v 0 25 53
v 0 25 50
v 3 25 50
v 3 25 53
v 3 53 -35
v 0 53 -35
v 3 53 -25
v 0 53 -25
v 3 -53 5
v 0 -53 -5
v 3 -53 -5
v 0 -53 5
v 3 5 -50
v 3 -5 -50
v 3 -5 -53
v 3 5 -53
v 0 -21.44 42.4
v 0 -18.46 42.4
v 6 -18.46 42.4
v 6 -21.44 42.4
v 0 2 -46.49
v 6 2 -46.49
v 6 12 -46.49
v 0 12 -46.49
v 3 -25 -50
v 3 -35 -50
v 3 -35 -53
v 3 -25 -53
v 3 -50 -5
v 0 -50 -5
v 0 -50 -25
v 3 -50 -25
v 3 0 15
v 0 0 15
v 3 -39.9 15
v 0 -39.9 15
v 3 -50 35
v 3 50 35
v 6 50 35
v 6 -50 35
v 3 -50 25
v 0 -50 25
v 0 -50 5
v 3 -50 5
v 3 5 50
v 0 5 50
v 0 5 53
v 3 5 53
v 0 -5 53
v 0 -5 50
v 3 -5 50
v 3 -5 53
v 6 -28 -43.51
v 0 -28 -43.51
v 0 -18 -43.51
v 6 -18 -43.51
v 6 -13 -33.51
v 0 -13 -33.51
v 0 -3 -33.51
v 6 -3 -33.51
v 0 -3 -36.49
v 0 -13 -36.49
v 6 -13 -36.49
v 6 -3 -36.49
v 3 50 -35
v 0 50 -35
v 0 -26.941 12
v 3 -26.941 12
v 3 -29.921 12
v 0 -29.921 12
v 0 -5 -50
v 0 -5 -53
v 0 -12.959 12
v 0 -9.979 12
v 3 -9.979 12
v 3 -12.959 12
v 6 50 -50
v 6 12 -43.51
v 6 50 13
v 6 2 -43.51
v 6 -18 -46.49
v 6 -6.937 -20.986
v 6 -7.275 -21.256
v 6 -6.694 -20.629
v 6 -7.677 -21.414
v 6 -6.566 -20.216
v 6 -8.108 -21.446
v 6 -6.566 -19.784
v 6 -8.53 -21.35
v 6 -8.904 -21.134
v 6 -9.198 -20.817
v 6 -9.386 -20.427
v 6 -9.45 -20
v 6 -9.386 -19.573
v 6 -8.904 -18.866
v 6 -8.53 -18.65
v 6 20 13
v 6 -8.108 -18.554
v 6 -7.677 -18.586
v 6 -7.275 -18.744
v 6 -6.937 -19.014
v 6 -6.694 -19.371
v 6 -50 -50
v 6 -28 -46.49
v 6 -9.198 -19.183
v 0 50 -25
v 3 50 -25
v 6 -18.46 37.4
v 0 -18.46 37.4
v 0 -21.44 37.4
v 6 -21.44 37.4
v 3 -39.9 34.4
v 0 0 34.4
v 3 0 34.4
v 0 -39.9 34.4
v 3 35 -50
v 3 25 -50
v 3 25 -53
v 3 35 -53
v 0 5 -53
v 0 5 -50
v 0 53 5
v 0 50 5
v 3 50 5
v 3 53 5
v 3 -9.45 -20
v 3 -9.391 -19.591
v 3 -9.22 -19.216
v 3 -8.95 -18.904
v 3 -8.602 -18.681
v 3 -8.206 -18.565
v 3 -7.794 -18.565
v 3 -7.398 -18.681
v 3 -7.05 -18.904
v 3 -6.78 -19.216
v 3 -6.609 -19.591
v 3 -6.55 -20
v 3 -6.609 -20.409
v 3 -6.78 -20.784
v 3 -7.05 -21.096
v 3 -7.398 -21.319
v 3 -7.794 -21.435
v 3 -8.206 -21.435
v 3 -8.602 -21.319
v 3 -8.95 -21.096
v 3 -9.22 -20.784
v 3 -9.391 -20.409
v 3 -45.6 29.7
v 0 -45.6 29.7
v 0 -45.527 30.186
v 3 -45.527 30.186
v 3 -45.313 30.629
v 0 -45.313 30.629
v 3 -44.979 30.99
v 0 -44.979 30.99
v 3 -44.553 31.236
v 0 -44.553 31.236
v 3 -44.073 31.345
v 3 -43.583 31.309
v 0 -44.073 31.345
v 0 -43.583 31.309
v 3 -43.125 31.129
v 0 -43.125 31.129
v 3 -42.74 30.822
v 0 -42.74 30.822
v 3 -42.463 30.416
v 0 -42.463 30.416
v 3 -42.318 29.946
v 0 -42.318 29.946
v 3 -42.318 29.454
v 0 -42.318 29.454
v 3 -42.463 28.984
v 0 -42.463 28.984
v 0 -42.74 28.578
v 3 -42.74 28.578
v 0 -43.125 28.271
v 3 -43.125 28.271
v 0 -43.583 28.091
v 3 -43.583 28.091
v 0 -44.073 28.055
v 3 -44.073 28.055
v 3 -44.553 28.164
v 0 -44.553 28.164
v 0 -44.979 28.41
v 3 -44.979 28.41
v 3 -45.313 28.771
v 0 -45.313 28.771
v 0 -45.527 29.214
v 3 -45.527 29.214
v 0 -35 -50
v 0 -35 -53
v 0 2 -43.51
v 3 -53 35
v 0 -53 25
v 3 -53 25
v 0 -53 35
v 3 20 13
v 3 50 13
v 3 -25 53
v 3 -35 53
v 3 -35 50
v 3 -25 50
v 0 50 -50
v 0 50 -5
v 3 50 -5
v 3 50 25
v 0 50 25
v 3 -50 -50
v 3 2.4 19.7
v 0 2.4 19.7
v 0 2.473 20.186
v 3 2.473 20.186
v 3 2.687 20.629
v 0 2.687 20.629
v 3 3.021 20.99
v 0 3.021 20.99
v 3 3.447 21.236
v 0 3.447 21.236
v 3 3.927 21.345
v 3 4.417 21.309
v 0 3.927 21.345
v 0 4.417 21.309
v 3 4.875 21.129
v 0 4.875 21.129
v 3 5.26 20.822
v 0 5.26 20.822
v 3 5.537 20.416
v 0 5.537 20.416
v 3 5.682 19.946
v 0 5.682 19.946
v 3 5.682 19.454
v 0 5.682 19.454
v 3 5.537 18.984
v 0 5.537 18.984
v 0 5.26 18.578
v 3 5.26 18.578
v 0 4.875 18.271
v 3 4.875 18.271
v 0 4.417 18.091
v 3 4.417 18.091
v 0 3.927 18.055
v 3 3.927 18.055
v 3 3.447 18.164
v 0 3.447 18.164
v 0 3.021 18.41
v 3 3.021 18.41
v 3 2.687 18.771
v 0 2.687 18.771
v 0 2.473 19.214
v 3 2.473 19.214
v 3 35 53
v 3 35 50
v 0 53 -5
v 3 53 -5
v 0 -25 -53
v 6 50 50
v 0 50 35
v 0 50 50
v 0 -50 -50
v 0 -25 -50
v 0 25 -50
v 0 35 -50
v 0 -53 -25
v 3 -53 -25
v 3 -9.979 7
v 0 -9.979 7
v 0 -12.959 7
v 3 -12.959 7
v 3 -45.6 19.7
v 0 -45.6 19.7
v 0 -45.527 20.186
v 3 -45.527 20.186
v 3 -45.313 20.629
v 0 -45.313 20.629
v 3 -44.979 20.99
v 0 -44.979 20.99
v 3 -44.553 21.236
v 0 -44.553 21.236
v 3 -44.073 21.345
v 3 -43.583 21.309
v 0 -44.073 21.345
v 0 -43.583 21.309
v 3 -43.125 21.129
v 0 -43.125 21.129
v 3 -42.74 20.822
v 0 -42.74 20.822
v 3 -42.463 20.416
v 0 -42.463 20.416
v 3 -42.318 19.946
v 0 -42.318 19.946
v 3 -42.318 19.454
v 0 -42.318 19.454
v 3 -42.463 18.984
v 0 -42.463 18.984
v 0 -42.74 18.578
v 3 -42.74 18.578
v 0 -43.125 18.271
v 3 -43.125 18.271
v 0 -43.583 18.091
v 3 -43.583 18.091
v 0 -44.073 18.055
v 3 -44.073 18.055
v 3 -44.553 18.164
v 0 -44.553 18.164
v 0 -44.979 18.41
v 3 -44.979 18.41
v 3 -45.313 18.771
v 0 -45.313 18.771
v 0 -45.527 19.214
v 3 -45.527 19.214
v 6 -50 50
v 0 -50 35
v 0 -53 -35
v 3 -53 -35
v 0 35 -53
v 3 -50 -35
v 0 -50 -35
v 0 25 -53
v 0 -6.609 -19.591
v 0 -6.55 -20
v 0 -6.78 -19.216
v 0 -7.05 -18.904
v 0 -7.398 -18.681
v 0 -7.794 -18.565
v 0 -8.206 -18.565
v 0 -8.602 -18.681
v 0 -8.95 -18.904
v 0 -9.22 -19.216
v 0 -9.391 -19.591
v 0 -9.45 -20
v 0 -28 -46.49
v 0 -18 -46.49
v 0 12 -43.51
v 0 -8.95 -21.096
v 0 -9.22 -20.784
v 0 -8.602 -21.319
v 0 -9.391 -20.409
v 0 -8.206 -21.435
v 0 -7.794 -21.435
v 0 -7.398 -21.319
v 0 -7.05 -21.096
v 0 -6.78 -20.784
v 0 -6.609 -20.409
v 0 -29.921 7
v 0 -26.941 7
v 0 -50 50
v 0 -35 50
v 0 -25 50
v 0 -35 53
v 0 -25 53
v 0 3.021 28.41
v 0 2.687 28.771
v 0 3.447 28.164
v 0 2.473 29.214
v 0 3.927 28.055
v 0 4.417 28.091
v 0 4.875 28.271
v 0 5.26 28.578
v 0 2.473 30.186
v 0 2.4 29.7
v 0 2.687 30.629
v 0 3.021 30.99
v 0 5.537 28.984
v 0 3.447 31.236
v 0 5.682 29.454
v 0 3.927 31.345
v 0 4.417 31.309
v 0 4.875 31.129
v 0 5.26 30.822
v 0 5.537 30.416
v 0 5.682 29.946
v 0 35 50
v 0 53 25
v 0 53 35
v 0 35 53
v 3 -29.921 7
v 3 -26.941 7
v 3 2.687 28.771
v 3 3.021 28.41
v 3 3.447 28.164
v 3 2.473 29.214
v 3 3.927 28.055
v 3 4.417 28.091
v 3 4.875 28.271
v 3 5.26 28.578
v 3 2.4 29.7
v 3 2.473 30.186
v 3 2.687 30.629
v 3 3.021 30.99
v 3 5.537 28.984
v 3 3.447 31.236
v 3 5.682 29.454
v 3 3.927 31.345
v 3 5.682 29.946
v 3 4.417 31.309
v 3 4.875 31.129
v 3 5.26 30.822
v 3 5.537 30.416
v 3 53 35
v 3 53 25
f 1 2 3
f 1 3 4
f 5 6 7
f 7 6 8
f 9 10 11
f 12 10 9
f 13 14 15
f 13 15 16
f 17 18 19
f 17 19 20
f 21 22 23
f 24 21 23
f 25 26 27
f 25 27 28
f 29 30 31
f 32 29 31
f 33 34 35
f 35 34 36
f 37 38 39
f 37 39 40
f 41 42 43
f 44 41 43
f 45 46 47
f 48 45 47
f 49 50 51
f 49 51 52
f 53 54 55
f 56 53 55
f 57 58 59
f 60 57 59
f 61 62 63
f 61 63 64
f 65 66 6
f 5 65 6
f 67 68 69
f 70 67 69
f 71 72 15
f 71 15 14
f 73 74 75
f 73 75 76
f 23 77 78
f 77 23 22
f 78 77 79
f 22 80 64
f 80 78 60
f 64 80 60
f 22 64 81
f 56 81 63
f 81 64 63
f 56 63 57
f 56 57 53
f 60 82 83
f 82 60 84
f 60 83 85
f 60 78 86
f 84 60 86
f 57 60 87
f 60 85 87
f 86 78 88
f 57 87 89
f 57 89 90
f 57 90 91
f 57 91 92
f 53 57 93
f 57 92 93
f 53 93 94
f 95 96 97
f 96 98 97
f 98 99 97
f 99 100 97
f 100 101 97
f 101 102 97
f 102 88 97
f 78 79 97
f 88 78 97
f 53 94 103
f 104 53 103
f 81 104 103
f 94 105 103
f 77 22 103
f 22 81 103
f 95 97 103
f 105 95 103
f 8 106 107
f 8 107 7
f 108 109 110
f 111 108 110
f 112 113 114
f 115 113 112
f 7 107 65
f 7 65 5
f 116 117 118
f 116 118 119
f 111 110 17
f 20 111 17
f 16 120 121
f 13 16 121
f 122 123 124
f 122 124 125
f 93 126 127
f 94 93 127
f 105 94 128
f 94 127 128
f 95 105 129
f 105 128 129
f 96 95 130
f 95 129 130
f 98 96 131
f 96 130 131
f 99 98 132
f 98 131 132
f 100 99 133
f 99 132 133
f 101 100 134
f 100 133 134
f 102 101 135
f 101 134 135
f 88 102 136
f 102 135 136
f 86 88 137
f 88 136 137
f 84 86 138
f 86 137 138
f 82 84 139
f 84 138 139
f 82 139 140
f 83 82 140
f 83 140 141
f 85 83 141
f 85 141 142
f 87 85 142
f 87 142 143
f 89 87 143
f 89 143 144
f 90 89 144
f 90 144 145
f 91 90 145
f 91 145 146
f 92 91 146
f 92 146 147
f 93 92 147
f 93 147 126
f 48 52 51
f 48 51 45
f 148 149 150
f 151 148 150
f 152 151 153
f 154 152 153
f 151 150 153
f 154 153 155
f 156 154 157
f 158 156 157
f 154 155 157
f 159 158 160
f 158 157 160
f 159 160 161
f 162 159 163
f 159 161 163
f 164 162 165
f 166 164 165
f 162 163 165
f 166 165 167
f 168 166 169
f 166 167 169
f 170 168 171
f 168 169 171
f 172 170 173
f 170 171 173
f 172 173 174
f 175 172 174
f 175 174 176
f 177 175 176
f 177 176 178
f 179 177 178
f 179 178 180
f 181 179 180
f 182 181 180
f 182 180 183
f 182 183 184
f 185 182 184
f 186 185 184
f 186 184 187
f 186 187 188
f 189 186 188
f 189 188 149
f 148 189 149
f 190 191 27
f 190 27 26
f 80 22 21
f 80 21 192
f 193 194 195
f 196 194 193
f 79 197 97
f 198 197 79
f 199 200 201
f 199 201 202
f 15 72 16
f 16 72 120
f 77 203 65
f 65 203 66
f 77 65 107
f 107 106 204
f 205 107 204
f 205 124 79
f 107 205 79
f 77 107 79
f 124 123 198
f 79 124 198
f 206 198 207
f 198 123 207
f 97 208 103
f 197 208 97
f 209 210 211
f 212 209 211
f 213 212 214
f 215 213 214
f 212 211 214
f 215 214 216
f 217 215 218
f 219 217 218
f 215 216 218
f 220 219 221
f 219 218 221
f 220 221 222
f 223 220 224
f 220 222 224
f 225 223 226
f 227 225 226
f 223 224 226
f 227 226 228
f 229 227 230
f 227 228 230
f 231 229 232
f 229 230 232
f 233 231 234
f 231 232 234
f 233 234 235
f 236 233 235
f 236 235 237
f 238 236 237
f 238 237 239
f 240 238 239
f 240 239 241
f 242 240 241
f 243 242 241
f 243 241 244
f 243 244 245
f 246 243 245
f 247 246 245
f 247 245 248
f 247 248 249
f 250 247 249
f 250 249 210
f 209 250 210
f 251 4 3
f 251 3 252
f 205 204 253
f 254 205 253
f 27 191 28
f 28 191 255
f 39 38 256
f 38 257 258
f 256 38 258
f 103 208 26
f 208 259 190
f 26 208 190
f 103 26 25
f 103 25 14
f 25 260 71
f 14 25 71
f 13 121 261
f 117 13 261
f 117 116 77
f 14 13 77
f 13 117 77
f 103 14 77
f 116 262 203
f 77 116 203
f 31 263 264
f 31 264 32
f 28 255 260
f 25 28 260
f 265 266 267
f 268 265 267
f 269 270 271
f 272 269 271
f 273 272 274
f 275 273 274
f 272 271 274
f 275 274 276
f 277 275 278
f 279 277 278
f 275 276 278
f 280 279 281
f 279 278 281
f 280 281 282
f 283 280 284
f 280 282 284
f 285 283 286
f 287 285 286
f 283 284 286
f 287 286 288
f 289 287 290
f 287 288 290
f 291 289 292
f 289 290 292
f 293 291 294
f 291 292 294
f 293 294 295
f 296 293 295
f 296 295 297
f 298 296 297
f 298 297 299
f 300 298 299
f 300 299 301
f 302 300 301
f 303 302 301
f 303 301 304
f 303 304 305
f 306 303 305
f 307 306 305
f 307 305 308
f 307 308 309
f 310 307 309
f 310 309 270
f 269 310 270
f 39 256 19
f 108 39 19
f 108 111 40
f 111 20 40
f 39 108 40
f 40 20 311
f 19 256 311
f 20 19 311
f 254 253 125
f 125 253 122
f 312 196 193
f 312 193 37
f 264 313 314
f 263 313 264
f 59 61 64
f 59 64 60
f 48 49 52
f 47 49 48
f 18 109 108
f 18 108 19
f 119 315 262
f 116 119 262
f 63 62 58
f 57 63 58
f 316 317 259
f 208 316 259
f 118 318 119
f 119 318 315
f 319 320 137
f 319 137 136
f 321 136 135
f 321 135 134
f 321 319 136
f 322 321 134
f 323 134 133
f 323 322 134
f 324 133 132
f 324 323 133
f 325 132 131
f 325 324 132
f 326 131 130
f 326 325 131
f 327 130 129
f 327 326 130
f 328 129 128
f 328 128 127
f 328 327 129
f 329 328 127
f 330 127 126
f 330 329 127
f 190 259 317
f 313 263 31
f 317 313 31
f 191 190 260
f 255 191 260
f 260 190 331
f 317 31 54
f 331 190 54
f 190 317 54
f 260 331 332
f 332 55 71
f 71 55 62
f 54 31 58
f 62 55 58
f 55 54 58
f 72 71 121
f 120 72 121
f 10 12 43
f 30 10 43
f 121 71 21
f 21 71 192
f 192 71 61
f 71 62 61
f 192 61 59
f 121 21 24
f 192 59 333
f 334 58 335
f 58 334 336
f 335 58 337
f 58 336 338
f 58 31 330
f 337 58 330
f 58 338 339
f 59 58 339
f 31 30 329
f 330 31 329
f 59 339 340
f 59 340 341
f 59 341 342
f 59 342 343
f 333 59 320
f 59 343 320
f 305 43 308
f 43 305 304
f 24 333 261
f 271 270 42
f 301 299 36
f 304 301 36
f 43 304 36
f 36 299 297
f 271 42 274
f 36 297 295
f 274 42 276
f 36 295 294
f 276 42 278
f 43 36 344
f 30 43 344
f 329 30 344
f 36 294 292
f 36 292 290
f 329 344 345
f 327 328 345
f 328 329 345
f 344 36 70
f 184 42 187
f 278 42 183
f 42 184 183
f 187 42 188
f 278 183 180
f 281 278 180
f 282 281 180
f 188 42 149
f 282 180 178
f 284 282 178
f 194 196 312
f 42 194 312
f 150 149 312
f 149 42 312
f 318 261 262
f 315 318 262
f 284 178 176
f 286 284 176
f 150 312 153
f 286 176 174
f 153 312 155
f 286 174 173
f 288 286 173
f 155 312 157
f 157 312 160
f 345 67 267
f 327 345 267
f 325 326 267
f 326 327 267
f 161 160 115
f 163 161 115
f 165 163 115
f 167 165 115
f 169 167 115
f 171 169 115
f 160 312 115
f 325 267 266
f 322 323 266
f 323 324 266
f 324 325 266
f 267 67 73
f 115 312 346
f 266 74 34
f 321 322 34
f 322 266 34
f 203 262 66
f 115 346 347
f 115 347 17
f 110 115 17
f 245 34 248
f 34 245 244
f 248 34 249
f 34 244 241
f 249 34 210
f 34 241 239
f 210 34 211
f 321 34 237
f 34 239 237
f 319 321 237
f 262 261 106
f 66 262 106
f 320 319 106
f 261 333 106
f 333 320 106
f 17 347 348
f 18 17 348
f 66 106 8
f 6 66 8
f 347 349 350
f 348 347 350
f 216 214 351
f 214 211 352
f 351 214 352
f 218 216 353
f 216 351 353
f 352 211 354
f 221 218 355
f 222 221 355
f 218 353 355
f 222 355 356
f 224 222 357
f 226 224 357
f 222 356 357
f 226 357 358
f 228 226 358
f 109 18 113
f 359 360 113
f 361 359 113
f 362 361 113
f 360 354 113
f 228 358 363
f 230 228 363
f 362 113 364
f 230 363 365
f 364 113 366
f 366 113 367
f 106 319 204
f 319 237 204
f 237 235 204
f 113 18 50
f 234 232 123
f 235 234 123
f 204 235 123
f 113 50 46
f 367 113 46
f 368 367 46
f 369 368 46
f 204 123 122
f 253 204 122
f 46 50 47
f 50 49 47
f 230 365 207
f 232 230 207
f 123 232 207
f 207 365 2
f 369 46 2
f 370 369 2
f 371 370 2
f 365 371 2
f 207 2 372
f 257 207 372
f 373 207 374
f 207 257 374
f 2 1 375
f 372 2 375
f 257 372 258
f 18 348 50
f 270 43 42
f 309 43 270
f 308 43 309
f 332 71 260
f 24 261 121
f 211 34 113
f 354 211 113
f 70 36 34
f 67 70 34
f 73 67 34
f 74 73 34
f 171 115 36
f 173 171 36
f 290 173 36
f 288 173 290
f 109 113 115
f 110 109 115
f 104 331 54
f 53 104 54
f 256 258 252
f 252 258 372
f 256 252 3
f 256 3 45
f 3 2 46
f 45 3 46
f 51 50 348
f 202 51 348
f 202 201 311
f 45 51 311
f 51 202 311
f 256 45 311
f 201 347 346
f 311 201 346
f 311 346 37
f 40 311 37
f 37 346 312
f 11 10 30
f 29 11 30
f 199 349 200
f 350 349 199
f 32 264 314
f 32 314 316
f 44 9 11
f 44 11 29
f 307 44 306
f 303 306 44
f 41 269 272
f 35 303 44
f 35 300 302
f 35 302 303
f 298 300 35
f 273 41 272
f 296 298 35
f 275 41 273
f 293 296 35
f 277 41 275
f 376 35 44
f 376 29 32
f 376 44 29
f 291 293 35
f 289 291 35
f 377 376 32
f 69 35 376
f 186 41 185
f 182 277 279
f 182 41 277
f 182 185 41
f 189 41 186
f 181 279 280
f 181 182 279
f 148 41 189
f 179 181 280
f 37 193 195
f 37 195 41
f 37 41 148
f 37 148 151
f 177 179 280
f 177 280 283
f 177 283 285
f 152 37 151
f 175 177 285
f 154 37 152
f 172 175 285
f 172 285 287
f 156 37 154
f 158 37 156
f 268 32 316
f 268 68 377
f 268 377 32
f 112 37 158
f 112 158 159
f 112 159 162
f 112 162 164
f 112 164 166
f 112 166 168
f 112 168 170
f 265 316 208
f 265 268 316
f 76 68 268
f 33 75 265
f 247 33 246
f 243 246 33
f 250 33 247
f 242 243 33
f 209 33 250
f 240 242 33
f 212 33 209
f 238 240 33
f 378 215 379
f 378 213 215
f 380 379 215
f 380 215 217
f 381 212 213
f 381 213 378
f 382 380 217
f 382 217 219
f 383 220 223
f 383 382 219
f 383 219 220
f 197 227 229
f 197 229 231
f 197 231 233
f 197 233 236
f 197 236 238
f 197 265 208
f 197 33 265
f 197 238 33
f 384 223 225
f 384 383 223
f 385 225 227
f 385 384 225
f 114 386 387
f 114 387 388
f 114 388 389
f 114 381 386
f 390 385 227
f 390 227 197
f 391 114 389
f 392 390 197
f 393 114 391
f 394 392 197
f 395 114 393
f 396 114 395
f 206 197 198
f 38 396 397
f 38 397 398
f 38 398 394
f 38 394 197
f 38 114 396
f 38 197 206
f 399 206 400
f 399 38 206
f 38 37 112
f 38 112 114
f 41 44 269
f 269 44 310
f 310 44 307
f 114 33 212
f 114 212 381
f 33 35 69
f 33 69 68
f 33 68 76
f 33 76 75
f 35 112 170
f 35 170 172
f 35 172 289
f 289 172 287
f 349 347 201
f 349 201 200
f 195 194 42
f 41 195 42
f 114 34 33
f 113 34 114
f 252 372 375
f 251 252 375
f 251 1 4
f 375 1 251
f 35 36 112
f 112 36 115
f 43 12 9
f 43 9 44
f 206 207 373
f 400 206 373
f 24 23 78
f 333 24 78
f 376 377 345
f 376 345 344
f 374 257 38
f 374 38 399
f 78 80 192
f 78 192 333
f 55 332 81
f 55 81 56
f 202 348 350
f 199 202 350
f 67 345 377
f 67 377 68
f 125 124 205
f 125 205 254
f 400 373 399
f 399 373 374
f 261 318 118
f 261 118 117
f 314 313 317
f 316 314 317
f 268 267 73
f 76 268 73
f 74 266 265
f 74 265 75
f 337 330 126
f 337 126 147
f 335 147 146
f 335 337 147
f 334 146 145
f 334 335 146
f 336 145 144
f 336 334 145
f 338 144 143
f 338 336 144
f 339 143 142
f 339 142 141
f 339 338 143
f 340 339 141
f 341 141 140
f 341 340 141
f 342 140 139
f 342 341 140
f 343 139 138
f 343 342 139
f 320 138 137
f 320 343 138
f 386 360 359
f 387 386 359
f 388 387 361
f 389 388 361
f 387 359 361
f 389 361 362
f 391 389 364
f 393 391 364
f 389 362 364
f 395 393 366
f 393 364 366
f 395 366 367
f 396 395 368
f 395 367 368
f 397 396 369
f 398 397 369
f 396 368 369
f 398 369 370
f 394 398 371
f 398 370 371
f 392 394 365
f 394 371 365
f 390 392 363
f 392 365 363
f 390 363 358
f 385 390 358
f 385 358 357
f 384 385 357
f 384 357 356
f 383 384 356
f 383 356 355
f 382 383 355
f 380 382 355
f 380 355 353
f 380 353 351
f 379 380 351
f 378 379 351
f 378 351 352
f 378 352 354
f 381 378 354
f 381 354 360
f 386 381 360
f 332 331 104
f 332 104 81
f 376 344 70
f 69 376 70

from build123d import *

# Parameters (mm, degrees)
F0_R     = 1.45
F0_W     = 10
F0_H     = 3
F0_W_2   = 3
F0_H_2   = 10
F1_DEPTH = 3
F2_R     = 1.65
F2_W     = 2.98
F2_H     = 5
F2_W_2   = 39.9
F2_H_2   = 19.4
F3_DEPTH = 25
F2_R_2   = 1.45
F4_DEPTH = 6
F5_W     = 10
F5_H     = 2.98
F6_DEPTH = 12.5


with BuildPart() as f1:
    # F0 (on Right) → F1 (new body)
    with BuildSketch(Plane.YZ):
        Polygon((-35, 50), (-50, 50), (-50, 35), (-47, 35), (-47, 25), (-50, 25), (-50, 5), (-47, 5), (-47, -5), (-50, -5), (-50, -25), (-47, -25), (-47, -35), (-50, -35), (-50, -50), (-35, -50), (-35, -47), (-25, -47), (-25, -50), (-5, -50), (-5, -47), (5, -47), (5, -50), (25, -50), (25, -47), (35, -47), (35, -50), (50, -50), (50, -35), (47, -35), (47, -25), (50, -25), (50, -5), (47, -5), (47, 5), (50, 5), (50, 25), (47, 25), (47, 35), (50, 35), (50, 50), (35, 50), (35, 47), (25, 47), (25, 50), (5, 50), (5, 47), (-5, 47), (-5, 50), (-25, 50), (-25, 47), (-35, 47), align=None)
        with Locations((-8, -20)):
            Circle(F0_R, mode=Mode.SUBTRACT)
        with Locations((-30, 51.5)):
            Rectangle(F0_W, F0_H)
        with Locations((-30, 48.5)):
            Rectangle(F0_W, F0_H)
        with Locations((-48.5, 30)):
            Rectangle(F0_W_2, F0_H_2)
        with Locations((-51.5, 30)):
            Rectangle(F0_W_2, F0_H_2)
        with Locations((0, 51.5)):
            Rectangle(F0_W, F0_H)
        with Locations((0, 48.5)):
            Rectangle(F0_W, F0_H)
        with Locations((-48.5, 0)):
            Rectangle(F0_W_2, F0_H_2)
        with Locations((-51.5, 0)):
            Rectangle(F0_W_2, F0_H_2)
        with Locations((30, 51.5)):
            Rectangle(F0_W, F0_H)
        with Locations((30, 48.5)):
            Rectangle(F0_W, F0_H)
        with Locations((-48.5, -30)):
            Rectangle(F0_W_2, F0_H_2)
        with Locations((-51.5, -30)):
            Rectangle(F0_W_2, F0_H_2)
        with Locations((51.5, 30)):
            Rectangle(F0_W_2, F0_H_2)
        with Locations((48.5, 30)):
            Rectangle(F0_W_2, F0_H_2)
        with Locations((-30, -48.5)):
            Rectangle(F0_W, F0_H)
        with Locations((-30, -51.5)):
            Rectangle(F0_W, F0_H)
        with Locations((51.5, 0)):
            Rectangle(F0_W_2, F0_H_2)
        with Locations((48.5, 0)):
            Rectangle(F0_W_2, F0_H_2)
        with Locations((0, -48.5)):
            Rectangle(F0_W, F0_H)
        with Locations((0, -51.5)):
            Rectangle(F0_W, F0_H)
        with Locations((51.5, -30)):
            Rectangle(F0_W_2, F0_H_2)
        with Locations((48.5, -30)):
            Rectangle(F0_W_2, F0_H_2)
        with Locations((30, -48.5)):
            Rectangle(F0_W, F0_H)
        with Locations((30, -51.5)):
            Rectangle(F0_W, F0_H)
    extrude(amount=F1_DEPTH)

    # F2 (on face) → F3 (cut)
    with BuildSketch(Plane(origin=(0, 0, 0), x_dir=(0, -1, 0), z_dir=(-1, 0, 0))):
        with Locations((-4.05, 29.7)):
            Circle(F2_R)
        with Locations((-4.05, 19.7)):
            Circle(F2_R)
        with Locations((43.95, 29.7)):
            Circle(F2_R)
        with Locations((43.95, 19.7)):
            Circle(F2_R)
        with Locations((11.4694618905, 9.5)):
            Rectangle(F2_W, F2_H)
        with Locations((28.4305381095, 9.5)):
            Rectangle(F2_W, F2_H)
        with Locations((19.95, 24.7)):
            Rectangle(F2_W_2, F2_H_2)
        with Locations((19.95, 39.9)):
            Rectangle(F2_W, F2_H)
    extrude(amount=-F3_DEPTH, mode=Mode.SUBTRACT)

    # F2 (on face) → F4 (join)
    with BuildSketch(Plane(origin=(0, 0, 0), x_dir=(0, -1, 0), z_dir=(-1, 0, 0))):
        Polygon((-50, 50), (-50, 35), (50, 35), (50, 50), (35, 50), (25, 50), (5, 50), (-5, 50), (-25, 50), (-35, 50), align=None)
        with Locations((19.95, 39.9)):
            Rectangle(F2_W, F2_H, mode=Mode.SUBTRACT)
        Polygon((-50, -35), (-50, -50), (-35, -50), (-25, -50), (-5, -50), (5, -50), (25, -50), (35, -50), (50, -50), (-20, 13), (-50, 13), (-50, 5), (-50, -5), (-50, -25), align=None)
        with Locations((8, -20)):
            Circle(F2_R_2, mode=Mode.SUBTRACT)
    extrude(amount=-F4_DEPTH)

    # F5 (on Right) → F6 (cut, symmetric)
    with BuildSketch(Plane.YZ):
        with Locations((-23, -45)):
            Rectangle(F5_W, F5_H)
        with Locations((-8, -35)):
            Rectangle(F5_W, F5_H)
        with Locations((7, -45)):
            Rectangle(F5_W, F5_H)
    extrude(amount=F6_DEPTH, both=True, mode=Mode.SUBTRACT)


solid = f1.part
